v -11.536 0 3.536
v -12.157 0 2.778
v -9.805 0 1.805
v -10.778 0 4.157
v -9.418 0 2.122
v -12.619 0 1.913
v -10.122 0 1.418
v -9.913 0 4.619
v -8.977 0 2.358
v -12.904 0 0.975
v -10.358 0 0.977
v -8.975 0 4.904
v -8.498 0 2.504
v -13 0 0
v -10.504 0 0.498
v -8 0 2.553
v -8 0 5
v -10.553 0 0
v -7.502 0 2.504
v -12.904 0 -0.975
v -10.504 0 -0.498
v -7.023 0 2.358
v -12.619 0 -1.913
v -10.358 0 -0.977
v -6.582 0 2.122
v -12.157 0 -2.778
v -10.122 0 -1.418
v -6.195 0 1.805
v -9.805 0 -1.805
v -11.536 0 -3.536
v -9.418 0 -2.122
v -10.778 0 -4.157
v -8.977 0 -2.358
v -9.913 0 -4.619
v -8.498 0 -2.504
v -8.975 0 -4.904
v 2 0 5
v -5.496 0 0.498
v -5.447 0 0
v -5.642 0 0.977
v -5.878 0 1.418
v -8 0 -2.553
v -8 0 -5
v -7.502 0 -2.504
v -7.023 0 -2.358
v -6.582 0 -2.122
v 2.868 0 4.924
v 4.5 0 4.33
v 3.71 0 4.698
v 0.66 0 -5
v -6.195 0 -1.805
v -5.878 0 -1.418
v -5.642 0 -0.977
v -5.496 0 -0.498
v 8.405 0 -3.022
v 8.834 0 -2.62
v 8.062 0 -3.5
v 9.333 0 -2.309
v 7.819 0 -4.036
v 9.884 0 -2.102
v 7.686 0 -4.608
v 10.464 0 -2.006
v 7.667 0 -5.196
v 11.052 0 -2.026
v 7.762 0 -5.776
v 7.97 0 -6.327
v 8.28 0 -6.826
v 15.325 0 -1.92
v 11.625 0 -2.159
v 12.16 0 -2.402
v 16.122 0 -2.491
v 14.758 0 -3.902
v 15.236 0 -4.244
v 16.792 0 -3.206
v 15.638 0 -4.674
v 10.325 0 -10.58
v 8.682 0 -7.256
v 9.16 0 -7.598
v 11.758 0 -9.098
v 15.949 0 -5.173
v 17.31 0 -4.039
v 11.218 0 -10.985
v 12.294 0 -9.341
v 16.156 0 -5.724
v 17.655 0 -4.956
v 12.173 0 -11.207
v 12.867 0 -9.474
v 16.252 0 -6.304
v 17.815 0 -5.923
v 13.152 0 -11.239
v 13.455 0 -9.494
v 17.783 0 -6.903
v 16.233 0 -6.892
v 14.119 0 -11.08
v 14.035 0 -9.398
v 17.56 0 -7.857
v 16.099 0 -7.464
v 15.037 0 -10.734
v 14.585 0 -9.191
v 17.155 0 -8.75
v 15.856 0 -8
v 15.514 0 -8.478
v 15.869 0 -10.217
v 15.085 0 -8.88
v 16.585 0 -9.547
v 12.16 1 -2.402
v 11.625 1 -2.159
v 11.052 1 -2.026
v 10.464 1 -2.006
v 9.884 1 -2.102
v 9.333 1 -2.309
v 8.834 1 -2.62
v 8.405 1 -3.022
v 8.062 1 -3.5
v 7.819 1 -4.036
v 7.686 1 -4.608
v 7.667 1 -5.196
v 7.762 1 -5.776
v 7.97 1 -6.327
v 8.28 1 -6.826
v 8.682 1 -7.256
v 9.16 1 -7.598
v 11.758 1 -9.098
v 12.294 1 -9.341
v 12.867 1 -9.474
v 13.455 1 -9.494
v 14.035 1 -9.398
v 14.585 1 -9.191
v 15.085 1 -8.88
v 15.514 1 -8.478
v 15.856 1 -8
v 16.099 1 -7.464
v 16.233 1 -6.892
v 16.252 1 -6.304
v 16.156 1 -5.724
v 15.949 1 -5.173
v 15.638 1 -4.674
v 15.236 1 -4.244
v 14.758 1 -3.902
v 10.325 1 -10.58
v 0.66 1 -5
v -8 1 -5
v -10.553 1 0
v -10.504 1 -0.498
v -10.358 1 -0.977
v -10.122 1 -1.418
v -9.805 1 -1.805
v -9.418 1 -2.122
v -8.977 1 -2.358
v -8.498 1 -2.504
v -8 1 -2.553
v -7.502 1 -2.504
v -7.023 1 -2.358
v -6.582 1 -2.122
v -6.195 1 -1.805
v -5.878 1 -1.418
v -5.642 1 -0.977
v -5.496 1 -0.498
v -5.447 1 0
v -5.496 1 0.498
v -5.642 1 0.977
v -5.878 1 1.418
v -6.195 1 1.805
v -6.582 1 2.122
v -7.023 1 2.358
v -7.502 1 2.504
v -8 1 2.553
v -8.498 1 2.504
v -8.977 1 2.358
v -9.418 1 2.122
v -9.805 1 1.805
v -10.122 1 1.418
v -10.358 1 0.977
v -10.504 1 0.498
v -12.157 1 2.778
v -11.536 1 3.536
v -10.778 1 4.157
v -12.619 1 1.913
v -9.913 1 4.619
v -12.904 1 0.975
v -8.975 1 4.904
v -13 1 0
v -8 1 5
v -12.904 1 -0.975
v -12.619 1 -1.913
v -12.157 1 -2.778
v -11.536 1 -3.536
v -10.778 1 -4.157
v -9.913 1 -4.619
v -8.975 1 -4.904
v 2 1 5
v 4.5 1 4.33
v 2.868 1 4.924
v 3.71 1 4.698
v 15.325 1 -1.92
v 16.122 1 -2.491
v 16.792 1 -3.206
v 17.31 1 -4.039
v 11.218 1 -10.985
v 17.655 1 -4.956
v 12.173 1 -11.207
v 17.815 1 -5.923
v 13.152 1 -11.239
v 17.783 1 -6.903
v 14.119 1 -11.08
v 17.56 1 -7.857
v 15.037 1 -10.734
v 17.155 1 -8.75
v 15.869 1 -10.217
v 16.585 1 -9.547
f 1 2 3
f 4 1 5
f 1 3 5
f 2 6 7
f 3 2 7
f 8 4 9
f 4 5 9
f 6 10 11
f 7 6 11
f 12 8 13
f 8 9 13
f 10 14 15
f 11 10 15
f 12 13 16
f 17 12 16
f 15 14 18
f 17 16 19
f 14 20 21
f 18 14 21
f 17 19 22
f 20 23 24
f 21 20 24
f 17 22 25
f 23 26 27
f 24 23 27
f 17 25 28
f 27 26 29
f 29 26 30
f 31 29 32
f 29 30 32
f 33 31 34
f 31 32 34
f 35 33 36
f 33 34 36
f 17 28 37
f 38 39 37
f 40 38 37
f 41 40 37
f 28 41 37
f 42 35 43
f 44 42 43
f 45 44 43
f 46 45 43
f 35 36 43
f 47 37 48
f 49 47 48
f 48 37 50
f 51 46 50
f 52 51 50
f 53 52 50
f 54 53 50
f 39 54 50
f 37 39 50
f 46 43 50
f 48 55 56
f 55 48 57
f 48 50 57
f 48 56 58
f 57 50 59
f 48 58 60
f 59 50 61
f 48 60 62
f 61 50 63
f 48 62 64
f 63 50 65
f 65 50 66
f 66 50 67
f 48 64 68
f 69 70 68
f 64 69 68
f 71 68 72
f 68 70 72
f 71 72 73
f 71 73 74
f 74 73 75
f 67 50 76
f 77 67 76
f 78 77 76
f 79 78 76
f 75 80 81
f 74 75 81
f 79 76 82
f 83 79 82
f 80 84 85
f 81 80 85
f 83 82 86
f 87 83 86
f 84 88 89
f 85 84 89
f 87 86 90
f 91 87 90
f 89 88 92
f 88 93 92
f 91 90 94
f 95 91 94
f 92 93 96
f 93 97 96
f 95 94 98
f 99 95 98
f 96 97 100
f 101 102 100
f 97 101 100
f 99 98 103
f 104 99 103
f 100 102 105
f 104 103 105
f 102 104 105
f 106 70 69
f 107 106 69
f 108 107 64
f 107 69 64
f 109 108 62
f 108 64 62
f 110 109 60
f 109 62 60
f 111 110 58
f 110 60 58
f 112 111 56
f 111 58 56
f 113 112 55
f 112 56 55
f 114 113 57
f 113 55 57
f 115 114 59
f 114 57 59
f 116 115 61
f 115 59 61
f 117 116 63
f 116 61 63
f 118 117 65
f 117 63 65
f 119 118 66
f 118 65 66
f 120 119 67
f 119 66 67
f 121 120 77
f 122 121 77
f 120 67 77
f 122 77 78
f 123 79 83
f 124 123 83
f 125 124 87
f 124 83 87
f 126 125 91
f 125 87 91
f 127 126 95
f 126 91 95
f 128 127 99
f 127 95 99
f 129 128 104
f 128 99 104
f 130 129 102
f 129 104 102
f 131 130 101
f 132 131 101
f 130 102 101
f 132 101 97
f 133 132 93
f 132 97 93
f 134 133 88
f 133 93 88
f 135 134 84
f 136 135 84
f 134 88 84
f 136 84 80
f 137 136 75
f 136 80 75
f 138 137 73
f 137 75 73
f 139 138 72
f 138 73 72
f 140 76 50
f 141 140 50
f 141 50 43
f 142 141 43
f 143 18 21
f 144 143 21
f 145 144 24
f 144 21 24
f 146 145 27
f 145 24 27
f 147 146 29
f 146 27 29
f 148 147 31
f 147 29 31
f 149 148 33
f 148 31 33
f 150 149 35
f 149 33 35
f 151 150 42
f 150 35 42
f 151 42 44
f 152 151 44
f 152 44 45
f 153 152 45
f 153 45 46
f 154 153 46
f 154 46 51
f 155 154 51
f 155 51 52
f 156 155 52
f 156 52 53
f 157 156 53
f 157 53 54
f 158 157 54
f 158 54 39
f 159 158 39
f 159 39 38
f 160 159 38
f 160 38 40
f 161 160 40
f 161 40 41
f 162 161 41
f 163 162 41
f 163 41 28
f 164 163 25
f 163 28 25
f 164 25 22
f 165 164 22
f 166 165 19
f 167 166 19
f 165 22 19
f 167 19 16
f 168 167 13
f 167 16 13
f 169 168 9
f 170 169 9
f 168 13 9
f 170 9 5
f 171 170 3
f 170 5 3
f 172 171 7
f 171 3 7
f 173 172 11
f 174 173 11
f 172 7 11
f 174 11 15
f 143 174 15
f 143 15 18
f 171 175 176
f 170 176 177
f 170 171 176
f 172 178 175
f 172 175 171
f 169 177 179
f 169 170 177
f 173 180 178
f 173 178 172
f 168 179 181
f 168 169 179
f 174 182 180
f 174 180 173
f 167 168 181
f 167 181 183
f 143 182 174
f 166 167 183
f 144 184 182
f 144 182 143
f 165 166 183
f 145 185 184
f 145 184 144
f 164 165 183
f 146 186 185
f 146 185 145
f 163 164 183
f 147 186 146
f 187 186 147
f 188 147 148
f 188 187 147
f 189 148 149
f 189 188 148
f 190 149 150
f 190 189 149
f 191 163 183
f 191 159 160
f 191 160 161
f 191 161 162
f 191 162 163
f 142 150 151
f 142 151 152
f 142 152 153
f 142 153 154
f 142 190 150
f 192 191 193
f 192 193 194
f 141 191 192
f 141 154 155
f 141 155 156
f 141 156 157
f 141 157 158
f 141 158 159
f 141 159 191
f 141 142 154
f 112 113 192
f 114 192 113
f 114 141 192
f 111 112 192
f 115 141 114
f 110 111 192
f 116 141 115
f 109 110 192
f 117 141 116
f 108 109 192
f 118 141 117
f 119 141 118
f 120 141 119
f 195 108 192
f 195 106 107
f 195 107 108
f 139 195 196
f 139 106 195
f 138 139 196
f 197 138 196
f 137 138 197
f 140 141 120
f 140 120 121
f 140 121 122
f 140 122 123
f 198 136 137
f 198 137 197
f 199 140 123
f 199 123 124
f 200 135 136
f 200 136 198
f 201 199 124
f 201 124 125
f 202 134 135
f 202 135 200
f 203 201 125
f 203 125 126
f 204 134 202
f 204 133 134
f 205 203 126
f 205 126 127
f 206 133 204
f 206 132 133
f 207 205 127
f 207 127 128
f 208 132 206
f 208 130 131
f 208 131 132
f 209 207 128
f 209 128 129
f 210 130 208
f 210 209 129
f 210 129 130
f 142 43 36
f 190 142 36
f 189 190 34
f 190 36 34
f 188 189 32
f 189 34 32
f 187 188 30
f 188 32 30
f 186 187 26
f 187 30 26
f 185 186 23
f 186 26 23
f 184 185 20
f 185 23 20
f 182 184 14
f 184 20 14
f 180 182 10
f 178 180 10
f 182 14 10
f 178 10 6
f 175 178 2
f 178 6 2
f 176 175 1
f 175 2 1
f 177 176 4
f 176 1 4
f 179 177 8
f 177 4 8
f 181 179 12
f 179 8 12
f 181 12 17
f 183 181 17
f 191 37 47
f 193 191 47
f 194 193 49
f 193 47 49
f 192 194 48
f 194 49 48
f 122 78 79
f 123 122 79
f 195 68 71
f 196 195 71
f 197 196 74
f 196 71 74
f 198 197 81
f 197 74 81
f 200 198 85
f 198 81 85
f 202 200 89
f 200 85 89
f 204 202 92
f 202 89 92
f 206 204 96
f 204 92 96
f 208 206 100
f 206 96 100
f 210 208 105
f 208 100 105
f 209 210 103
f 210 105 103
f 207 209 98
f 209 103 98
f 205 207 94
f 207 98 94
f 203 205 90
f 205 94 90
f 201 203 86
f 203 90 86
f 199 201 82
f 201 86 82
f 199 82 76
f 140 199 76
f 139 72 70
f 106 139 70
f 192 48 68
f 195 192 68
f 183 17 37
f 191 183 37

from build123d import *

# Parameters (mm, degrees)
BOSS_EXTRUDE1_DEPTH    = 1
F_10_CLEARANCE_HOLE1_D = 5.1054


with BuildPart() as part:
    # Sketch1 → Boss-Extrude1 (new body)
    # profile 1 of 3: a face of its own
    with BuildSketch(Plane(origin=(0, 0, 0), x_dir=(1, 0, 0), z_dir=(0, 1, 0))):
        with BuildLine():
            Line((0.660254038, 5), (-8, 5))
            ThreePointArc((-8, 5), (-13, 0), (-8, -5))
            Line((-8, -5), (2, -5))
            ThreePointArc((2, -5), (-2.829629131, -1.294095226), (-0.5, 4.330127019))
            Line((-0.5, 4.330127019), (0.660254038, 5))
        make_face()
    # profile 2 of 3: a face of its own
    with BuildSketch(Plane(origin=(0, 0, 0), x_dir=(1, 0, 0), z_dir=(0, 1, 0))):
        with BuildLine():
            Line((2, 5), (0.660254038, 5))
            Line((0.660254038, 5), (-0.5, 4.330127019))
            ThreePointArc((-0.5, 4.330127019), (-2.829629131, -1.294095226), (2, -5))
            ThreePointArc((2, -5), (3.294095226, -4.829629131), (4.5, -4.330127019))
            ThreePointArc((4.5, -4.330127019), (6.829629131, 1.294095226), (2, 5))
        make_face()
    # profile 3 of 3: a face of its own
    with BuildSketch(Plane(origin=(0, 0, 0), x_dir=(1, 0, 0), z_dir=(0, 1, 0))):
        with BuildLine():
            Line((10.325317547, 10.580127019), (0.660254038, 5))
            Line((0.660254038, 5), (2, 5))
            ThreePointArc((2, 5), (6.829629131, 1.294095226), (4.5, -4.330127019))
            Line((4.5, -4.330127019), (15.325317547, 1.919872981))
            ThreePointArc((15.325317547, 1.919872981), (17.155444566, 8.75), (10.325317547, 10.580127019))
        make_face()
        with BuildLine():
            ThreePointArc((12.160254038, 2.401923789), (8.062177826, 3.5), (9.160254038, 7.598076211))
            Line((9.160254038, 7.598076211), (11.758330249, 9.098076211))
            ThreePointArc((11.758330249, 9.098076211), (15.856406461, 8), (14.758330249, 3.901923789))
            Line((14.758330249, 3.901923789), (12.160254038, 2.401923789))
        make_face(mode=Mode.SUBTRACT)
    extrude(amount=BOSS_EXTRUDE1_DEPTH)

    # #10 Clearance Hole1 (through all)
    with Locations(Plane(origin=(0, 1, 0), x_dir=(1, 0, 0), z_dir=(0, 1, 0))):
        with Locations((-8, 0)):
            Hole(F_10_CLEARANCE_HOLE1_D / 2)


solid = part.part
